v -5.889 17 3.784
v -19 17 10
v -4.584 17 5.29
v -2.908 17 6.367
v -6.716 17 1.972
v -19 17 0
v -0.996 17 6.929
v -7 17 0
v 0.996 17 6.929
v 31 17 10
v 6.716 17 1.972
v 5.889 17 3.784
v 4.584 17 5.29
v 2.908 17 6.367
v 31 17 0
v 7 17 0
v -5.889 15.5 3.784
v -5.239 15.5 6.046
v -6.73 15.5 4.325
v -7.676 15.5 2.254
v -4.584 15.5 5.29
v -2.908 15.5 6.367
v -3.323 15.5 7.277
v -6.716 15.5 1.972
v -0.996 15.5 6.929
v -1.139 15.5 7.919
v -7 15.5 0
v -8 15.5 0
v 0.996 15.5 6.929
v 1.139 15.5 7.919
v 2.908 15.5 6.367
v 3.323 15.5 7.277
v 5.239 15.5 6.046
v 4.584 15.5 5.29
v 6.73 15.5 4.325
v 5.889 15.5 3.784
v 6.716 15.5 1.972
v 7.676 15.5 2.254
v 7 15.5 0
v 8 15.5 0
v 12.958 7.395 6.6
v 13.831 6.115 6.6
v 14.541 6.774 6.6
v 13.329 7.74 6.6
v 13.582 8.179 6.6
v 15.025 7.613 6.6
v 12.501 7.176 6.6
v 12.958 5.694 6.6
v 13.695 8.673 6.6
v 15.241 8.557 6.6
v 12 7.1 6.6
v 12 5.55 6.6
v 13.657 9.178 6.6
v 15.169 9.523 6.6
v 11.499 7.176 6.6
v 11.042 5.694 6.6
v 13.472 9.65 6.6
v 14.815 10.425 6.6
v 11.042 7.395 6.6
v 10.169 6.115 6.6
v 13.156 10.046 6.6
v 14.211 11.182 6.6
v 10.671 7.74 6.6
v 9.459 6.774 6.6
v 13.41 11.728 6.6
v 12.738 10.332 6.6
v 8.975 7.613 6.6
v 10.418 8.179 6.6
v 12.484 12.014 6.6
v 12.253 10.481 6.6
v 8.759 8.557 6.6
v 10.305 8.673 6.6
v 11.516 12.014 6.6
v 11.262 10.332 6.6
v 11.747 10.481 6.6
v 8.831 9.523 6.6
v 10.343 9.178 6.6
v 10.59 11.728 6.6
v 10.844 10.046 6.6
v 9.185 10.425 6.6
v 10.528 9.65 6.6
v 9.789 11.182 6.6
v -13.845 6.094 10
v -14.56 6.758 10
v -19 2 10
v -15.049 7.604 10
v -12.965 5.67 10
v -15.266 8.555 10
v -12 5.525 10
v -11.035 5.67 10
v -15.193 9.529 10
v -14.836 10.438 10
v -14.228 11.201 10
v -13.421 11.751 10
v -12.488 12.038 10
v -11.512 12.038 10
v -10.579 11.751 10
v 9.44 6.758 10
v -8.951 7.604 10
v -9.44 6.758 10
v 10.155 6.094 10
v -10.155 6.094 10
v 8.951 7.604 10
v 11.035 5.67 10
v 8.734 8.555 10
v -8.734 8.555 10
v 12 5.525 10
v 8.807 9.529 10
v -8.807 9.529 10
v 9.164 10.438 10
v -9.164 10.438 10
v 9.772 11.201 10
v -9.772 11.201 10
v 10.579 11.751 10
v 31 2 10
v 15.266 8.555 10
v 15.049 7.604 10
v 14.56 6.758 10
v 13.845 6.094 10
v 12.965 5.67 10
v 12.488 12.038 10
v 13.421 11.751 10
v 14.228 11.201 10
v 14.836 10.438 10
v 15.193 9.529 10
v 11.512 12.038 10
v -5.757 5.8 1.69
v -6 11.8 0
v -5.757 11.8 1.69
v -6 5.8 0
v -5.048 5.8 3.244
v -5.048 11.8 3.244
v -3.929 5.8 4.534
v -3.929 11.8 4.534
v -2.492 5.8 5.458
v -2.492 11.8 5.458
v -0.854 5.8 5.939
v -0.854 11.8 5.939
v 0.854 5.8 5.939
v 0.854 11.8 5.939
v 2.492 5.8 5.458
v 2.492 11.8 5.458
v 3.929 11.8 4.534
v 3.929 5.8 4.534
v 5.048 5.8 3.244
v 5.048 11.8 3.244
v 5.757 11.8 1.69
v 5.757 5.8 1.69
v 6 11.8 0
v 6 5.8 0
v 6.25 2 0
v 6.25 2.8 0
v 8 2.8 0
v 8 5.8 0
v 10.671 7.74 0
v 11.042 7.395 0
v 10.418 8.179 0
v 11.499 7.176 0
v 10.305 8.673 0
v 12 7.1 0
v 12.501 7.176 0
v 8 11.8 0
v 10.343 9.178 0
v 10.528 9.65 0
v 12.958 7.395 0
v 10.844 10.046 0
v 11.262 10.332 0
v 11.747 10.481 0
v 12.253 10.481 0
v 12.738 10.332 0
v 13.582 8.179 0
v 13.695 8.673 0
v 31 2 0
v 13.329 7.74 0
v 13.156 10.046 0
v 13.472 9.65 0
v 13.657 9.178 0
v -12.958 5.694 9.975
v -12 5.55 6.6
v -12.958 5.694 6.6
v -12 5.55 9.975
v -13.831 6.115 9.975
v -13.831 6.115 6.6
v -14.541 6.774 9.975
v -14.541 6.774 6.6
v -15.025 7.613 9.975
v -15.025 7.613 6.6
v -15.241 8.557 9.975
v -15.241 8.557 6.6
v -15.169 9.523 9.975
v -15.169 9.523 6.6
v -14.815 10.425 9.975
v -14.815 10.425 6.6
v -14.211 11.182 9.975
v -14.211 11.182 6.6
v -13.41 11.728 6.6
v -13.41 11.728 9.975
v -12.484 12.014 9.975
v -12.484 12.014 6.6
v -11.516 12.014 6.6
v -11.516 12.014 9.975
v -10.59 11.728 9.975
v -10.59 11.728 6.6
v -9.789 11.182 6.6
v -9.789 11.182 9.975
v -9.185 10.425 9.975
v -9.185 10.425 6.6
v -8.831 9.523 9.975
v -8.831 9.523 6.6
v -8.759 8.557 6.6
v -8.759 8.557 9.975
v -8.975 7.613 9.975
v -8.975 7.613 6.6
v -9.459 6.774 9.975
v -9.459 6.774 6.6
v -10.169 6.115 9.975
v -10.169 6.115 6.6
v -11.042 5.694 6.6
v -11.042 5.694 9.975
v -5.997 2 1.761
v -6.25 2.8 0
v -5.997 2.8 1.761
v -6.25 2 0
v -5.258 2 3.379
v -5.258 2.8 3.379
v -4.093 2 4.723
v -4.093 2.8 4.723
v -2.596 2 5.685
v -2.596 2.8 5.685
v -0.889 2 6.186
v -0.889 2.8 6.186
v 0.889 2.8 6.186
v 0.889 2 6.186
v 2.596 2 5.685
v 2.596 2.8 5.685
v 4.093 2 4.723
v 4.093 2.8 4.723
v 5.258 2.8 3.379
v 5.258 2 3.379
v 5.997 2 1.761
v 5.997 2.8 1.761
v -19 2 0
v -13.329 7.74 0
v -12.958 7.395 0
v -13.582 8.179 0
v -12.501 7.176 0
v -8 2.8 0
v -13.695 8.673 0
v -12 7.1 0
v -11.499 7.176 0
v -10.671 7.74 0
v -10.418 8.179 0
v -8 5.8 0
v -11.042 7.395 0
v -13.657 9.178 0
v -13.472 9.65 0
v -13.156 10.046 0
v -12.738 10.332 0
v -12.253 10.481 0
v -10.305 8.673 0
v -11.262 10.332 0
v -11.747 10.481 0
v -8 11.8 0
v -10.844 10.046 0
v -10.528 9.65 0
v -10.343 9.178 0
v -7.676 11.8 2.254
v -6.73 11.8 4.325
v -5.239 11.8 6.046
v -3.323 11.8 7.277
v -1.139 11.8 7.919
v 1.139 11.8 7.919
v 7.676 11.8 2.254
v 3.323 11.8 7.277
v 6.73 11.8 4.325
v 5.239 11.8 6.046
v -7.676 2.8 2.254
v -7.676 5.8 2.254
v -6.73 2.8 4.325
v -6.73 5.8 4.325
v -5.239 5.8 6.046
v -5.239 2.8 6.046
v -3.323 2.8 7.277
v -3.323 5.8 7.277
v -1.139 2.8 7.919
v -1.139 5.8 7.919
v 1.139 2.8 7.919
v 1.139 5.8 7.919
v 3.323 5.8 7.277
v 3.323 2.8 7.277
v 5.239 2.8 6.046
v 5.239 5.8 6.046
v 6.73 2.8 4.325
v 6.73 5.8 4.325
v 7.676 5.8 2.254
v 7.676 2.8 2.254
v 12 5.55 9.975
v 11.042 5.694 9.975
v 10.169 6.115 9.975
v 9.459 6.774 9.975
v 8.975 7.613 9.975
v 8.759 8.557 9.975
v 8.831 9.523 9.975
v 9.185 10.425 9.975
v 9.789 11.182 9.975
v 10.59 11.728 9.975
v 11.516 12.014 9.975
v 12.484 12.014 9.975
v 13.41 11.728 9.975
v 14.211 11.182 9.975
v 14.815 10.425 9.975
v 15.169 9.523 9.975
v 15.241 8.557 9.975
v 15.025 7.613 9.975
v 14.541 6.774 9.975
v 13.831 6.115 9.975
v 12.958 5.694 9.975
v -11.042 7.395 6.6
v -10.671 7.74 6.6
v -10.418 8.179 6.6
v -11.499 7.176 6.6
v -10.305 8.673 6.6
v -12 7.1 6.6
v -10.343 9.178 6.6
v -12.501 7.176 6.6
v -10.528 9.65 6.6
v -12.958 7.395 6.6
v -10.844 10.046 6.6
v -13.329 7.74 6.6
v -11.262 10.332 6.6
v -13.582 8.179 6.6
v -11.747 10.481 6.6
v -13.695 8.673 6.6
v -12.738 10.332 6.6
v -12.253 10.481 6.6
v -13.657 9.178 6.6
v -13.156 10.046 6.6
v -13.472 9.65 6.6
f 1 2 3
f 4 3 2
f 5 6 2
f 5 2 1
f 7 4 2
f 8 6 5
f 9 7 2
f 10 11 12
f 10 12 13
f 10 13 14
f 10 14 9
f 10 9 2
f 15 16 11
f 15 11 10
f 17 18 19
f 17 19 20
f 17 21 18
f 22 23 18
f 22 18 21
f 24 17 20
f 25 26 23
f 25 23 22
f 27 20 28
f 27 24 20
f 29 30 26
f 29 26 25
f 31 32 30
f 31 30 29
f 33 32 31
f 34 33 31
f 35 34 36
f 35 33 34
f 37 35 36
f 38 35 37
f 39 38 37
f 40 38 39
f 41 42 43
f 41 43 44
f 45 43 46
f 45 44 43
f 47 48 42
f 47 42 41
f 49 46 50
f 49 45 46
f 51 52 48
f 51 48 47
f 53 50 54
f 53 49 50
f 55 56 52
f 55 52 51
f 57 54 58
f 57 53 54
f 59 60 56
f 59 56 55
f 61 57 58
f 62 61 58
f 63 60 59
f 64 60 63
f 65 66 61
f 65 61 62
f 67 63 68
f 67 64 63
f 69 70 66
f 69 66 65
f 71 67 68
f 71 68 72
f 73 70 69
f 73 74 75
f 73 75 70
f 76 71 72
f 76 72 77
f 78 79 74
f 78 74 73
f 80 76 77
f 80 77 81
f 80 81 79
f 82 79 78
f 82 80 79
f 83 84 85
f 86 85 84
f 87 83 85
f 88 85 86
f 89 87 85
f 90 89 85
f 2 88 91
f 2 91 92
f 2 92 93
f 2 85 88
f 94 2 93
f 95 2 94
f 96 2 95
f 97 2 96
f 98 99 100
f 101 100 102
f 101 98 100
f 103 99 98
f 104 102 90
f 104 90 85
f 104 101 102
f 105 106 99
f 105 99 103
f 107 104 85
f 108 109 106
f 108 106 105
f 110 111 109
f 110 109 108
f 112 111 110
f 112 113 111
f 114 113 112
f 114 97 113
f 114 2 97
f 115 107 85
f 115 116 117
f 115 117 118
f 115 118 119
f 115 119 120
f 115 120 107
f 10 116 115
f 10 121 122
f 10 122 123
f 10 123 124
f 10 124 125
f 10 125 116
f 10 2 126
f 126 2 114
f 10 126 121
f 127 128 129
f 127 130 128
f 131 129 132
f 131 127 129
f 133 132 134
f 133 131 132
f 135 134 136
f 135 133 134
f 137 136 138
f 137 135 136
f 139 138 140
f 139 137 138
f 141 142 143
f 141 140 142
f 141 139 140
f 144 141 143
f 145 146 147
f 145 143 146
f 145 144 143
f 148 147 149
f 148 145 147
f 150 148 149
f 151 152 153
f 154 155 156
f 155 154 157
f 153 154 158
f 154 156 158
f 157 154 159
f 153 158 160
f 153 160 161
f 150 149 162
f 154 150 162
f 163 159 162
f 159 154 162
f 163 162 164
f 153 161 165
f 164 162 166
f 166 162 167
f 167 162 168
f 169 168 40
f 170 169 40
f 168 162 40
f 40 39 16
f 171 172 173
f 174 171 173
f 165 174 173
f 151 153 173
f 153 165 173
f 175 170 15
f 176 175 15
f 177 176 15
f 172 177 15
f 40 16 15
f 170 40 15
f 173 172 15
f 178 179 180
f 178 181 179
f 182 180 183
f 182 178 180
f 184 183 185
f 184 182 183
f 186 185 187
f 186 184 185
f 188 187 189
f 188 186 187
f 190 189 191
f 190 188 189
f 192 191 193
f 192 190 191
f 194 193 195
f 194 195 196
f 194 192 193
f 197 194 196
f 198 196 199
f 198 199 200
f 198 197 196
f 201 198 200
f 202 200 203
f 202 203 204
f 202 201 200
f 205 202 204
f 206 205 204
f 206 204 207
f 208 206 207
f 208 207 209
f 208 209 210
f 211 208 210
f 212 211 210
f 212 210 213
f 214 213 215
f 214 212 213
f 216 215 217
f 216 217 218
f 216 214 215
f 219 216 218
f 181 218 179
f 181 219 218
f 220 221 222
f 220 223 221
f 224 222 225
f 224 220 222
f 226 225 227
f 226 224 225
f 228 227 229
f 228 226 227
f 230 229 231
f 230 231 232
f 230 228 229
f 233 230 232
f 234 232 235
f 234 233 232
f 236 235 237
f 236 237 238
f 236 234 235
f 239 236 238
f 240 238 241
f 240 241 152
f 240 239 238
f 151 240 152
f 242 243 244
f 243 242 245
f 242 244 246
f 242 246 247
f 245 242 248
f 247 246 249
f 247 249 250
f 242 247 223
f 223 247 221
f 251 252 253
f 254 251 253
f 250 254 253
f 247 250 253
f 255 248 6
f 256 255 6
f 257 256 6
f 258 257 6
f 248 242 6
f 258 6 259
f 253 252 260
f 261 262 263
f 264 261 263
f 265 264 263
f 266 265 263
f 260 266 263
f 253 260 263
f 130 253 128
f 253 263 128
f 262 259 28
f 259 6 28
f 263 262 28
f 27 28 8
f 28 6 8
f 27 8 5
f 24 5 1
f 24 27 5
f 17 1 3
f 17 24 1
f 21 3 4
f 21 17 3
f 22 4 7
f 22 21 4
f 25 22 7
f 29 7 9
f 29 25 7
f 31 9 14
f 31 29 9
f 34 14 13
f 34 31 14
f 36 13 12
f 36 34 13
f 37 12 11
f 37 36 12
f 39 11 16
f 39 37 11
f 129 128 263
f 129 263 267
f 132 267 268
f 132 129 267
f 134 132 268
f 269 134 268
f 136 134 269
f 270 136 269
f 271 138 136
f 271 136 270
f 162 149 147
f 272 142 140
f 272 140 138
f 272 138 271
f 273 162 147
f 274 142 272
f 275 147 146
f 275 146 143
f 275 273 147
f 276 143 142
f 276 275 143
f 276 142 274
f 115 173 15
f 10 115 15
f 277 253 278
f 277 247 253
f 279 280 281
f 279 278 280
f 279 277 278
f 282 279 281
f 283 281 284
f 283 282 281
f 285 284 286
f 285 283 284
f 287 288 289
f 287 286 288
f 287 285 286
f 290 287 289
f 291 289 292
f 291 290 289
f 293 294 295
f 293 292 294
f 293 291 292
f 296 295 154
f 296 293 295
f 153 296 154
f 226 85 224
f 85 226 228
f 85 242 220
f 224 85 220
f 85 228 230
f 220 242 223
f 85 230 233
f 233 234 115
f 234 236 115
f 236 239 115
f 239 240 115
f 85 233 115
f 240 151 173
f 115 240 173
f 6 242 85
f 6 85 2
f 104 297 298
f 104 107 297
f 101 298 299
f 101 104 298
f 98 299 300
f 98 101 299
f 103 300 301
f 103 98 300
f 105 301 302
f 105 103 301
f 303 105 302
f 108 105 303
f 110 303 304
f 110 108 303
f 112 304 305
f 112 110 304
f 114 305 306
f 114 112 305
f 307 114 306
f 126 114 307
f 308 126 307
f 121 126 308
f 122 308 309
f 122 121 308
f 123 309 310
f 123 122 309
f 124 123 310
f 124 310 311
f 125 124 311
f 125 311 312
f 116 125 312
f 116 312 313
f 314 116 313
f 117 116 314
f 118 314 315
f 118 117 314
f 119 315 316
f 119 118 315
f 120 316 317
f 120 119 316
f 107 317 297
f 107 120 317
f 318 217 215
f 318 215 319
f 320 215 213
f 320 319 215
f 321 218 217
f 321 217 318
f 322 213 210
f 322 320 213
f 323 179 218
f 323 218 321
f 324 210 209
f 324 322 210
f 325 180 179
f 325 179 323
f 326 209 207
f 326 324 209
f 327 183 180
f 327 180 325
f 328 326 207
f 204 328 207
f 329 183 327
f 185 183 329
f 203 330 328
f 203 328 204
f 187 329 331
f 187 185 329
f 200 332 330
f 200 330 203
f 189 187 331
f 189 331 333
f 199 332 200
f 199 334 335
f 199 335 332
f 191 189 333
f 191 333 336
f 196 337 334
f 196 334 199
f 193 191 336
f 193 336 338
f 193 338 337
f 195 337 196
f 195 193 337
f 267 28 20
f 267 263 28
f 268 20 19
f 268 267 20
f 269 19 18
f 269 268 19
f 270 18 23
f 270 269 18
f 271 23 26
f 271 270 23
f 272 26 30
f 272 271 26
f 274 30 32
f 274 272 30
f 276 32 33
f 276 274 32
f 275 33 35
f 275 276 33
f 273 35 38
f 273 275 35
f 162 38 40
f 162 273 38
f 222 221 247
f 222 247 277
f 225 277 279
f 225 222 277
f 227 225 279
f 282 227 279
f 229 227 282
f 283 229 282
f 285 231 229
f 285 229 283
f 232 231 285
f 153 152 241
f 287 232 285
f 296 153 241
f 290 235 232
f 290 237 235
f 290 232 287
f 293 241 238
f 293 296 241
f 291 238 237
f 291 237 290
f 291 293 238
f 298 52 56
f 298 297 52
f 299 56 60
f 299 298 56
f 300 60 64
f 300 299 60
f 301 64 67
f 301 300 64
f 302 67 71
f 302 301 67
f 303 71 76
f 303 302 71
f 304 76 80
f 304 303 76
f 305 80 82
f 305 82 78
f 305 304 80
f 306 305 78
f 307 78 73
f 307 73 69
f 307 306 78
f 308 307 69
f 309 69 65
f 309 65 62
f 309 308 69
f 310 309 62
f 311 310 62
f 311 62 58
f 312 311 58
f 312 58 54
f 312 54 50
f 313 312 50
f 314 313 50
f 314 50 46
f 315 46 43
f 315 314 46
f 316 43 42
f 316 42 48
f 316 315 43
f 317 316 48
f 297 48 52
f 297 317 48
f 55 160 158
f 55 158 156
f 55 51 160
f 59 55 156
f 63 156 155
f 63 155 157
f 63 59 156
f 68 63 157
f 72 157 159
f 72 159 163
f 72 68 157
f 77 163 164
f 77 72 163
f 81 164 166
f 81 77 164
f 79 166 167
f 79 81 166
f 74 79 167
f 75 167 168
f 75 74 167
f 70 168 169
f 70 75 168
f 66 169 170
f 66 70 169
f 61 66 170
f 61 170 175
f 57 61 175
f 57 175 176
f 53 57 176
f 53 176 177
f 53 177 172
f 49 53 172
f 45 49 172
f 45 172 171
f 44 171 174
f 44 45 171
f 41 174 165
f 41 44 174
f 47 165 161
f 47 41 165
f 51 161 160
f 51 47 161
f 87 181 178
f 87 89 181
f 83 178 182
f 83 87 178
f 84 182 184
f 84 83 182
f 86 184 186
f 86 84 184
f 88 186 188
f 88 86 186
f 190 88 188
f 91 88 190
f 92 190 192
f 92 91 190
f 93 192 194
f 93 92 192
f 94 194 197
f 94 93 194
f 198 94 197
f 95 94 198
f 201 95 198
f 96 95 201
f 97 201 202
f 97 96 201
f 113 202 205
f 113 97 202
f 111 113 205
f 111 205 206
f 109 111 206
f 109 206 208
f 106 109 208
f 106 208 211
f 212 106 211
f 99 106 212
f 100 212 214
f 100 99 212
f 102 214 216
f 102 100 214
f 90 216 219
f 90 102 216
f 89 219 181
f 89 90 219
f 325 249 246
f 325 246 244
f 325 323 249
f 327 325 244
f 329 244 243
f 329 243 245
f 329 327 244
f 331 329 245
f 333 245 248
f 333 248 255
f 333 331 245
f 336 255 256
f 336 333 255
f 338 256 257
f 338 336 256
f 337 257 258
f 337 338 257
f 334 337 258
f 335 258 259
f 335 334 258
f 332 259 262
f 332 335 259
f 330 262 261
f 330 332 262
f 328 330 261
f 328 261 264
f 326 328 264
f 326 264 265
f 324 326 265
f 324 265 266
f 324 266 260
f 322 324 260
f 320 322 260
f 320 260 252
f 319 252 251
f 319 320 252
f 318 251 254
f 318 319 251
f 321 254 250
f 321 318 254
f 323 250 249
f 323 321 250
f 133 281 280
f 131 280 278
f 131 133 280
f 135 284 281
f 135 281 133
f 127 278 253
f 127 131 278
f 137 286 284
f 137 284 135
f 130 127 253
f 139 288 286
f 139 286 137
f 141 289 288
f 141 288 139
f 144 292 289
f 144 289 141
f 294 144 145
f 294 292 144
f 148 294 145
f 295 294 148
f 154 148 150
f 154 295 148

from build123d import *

# Parameters (mm, degrees)
SKETCH1_W                                    = 50
SKETCH1_H                                    = 15
BOSS_EXTRUDE1_DEPTH                          = 10
CBORE_FOR_M3_HEX_SOCKET_HEAD_CAP_SCR_2_COUNT = 2
CBORE_FOR_M3_HEX_SOCKET_HEAD_CAP_SCR_2_PITCH = 24


with BuildPart() as part:
    # Sketch1 → Boss-Extrude1 (new body)
    with BuildSketch(Plane.XY):
        with Locations((6, 9.5)):
            Rectangle(SKETCH1_W, SKETCH1_H)
    extrude(amount=BOSS_EXTRUDE1_DEPTH)

    # Sketch2 → Cut-Revolve1 (revolve, cut)
    with BuildSketch(Plane(origin=(0, 0, 0), x_dir=(0, 0, -1), z_dir=(1, 0, 0))):
        Polygon((0, 17), (-7, 17), (-7, 15.5), (-8, 15.5), (-8, 11.8), (-6, 11.8), (-6, 5.8), (-8, 5.8), (-8, 2.8), (-6.25, 2.8), (-6.25, 2), (0, 2), align=None)
    revolve(axis=Axis((0, 2, 0), (0, 1, 0)), mode=Mode.SUBTRACT)

    # Sketch4 → CBORE for M3 Hex Socket Head Cap Screw1 (revolve, cut)
    with BuildSketch(Plane(origin=(-12, 8.8, 10), x_dir=(0, -1, 0), z_dir=(1, 0, 0))):
        Polygon((0, 0), (0, 10), (1.7, 10), (1.7, 3.4), (3.25, 3.4), (3.25, 0.025), (3.275, 0), align=None)
    cbore_for_m3_hex_socket_head_cap_screw1 = revolve(axis=Axis((-12, 8.8, 16.35), (0, 0, -1)), mode=Mode.SUBTRACT)

    # CBORE for M3 Hex Socket Head Cap Scr 2: CBORE for M3 Hex Socket Head Cap Screw1 ×2
    with Locations(*[(i * CBORE_FOR_M3_HEX_SOCKET_HEAD_CAP_SCR_2_PITCH, 0, 0) for i in range(1, CBORE_FOR_M3_HEX_SOCKET_HEAD_CAP_SCR_2_COUNT)]):
        add(cbore_for_m3_hex_socket_head_cap_screw1, mode=Mode.SUBTRACT)


solid = part.part
